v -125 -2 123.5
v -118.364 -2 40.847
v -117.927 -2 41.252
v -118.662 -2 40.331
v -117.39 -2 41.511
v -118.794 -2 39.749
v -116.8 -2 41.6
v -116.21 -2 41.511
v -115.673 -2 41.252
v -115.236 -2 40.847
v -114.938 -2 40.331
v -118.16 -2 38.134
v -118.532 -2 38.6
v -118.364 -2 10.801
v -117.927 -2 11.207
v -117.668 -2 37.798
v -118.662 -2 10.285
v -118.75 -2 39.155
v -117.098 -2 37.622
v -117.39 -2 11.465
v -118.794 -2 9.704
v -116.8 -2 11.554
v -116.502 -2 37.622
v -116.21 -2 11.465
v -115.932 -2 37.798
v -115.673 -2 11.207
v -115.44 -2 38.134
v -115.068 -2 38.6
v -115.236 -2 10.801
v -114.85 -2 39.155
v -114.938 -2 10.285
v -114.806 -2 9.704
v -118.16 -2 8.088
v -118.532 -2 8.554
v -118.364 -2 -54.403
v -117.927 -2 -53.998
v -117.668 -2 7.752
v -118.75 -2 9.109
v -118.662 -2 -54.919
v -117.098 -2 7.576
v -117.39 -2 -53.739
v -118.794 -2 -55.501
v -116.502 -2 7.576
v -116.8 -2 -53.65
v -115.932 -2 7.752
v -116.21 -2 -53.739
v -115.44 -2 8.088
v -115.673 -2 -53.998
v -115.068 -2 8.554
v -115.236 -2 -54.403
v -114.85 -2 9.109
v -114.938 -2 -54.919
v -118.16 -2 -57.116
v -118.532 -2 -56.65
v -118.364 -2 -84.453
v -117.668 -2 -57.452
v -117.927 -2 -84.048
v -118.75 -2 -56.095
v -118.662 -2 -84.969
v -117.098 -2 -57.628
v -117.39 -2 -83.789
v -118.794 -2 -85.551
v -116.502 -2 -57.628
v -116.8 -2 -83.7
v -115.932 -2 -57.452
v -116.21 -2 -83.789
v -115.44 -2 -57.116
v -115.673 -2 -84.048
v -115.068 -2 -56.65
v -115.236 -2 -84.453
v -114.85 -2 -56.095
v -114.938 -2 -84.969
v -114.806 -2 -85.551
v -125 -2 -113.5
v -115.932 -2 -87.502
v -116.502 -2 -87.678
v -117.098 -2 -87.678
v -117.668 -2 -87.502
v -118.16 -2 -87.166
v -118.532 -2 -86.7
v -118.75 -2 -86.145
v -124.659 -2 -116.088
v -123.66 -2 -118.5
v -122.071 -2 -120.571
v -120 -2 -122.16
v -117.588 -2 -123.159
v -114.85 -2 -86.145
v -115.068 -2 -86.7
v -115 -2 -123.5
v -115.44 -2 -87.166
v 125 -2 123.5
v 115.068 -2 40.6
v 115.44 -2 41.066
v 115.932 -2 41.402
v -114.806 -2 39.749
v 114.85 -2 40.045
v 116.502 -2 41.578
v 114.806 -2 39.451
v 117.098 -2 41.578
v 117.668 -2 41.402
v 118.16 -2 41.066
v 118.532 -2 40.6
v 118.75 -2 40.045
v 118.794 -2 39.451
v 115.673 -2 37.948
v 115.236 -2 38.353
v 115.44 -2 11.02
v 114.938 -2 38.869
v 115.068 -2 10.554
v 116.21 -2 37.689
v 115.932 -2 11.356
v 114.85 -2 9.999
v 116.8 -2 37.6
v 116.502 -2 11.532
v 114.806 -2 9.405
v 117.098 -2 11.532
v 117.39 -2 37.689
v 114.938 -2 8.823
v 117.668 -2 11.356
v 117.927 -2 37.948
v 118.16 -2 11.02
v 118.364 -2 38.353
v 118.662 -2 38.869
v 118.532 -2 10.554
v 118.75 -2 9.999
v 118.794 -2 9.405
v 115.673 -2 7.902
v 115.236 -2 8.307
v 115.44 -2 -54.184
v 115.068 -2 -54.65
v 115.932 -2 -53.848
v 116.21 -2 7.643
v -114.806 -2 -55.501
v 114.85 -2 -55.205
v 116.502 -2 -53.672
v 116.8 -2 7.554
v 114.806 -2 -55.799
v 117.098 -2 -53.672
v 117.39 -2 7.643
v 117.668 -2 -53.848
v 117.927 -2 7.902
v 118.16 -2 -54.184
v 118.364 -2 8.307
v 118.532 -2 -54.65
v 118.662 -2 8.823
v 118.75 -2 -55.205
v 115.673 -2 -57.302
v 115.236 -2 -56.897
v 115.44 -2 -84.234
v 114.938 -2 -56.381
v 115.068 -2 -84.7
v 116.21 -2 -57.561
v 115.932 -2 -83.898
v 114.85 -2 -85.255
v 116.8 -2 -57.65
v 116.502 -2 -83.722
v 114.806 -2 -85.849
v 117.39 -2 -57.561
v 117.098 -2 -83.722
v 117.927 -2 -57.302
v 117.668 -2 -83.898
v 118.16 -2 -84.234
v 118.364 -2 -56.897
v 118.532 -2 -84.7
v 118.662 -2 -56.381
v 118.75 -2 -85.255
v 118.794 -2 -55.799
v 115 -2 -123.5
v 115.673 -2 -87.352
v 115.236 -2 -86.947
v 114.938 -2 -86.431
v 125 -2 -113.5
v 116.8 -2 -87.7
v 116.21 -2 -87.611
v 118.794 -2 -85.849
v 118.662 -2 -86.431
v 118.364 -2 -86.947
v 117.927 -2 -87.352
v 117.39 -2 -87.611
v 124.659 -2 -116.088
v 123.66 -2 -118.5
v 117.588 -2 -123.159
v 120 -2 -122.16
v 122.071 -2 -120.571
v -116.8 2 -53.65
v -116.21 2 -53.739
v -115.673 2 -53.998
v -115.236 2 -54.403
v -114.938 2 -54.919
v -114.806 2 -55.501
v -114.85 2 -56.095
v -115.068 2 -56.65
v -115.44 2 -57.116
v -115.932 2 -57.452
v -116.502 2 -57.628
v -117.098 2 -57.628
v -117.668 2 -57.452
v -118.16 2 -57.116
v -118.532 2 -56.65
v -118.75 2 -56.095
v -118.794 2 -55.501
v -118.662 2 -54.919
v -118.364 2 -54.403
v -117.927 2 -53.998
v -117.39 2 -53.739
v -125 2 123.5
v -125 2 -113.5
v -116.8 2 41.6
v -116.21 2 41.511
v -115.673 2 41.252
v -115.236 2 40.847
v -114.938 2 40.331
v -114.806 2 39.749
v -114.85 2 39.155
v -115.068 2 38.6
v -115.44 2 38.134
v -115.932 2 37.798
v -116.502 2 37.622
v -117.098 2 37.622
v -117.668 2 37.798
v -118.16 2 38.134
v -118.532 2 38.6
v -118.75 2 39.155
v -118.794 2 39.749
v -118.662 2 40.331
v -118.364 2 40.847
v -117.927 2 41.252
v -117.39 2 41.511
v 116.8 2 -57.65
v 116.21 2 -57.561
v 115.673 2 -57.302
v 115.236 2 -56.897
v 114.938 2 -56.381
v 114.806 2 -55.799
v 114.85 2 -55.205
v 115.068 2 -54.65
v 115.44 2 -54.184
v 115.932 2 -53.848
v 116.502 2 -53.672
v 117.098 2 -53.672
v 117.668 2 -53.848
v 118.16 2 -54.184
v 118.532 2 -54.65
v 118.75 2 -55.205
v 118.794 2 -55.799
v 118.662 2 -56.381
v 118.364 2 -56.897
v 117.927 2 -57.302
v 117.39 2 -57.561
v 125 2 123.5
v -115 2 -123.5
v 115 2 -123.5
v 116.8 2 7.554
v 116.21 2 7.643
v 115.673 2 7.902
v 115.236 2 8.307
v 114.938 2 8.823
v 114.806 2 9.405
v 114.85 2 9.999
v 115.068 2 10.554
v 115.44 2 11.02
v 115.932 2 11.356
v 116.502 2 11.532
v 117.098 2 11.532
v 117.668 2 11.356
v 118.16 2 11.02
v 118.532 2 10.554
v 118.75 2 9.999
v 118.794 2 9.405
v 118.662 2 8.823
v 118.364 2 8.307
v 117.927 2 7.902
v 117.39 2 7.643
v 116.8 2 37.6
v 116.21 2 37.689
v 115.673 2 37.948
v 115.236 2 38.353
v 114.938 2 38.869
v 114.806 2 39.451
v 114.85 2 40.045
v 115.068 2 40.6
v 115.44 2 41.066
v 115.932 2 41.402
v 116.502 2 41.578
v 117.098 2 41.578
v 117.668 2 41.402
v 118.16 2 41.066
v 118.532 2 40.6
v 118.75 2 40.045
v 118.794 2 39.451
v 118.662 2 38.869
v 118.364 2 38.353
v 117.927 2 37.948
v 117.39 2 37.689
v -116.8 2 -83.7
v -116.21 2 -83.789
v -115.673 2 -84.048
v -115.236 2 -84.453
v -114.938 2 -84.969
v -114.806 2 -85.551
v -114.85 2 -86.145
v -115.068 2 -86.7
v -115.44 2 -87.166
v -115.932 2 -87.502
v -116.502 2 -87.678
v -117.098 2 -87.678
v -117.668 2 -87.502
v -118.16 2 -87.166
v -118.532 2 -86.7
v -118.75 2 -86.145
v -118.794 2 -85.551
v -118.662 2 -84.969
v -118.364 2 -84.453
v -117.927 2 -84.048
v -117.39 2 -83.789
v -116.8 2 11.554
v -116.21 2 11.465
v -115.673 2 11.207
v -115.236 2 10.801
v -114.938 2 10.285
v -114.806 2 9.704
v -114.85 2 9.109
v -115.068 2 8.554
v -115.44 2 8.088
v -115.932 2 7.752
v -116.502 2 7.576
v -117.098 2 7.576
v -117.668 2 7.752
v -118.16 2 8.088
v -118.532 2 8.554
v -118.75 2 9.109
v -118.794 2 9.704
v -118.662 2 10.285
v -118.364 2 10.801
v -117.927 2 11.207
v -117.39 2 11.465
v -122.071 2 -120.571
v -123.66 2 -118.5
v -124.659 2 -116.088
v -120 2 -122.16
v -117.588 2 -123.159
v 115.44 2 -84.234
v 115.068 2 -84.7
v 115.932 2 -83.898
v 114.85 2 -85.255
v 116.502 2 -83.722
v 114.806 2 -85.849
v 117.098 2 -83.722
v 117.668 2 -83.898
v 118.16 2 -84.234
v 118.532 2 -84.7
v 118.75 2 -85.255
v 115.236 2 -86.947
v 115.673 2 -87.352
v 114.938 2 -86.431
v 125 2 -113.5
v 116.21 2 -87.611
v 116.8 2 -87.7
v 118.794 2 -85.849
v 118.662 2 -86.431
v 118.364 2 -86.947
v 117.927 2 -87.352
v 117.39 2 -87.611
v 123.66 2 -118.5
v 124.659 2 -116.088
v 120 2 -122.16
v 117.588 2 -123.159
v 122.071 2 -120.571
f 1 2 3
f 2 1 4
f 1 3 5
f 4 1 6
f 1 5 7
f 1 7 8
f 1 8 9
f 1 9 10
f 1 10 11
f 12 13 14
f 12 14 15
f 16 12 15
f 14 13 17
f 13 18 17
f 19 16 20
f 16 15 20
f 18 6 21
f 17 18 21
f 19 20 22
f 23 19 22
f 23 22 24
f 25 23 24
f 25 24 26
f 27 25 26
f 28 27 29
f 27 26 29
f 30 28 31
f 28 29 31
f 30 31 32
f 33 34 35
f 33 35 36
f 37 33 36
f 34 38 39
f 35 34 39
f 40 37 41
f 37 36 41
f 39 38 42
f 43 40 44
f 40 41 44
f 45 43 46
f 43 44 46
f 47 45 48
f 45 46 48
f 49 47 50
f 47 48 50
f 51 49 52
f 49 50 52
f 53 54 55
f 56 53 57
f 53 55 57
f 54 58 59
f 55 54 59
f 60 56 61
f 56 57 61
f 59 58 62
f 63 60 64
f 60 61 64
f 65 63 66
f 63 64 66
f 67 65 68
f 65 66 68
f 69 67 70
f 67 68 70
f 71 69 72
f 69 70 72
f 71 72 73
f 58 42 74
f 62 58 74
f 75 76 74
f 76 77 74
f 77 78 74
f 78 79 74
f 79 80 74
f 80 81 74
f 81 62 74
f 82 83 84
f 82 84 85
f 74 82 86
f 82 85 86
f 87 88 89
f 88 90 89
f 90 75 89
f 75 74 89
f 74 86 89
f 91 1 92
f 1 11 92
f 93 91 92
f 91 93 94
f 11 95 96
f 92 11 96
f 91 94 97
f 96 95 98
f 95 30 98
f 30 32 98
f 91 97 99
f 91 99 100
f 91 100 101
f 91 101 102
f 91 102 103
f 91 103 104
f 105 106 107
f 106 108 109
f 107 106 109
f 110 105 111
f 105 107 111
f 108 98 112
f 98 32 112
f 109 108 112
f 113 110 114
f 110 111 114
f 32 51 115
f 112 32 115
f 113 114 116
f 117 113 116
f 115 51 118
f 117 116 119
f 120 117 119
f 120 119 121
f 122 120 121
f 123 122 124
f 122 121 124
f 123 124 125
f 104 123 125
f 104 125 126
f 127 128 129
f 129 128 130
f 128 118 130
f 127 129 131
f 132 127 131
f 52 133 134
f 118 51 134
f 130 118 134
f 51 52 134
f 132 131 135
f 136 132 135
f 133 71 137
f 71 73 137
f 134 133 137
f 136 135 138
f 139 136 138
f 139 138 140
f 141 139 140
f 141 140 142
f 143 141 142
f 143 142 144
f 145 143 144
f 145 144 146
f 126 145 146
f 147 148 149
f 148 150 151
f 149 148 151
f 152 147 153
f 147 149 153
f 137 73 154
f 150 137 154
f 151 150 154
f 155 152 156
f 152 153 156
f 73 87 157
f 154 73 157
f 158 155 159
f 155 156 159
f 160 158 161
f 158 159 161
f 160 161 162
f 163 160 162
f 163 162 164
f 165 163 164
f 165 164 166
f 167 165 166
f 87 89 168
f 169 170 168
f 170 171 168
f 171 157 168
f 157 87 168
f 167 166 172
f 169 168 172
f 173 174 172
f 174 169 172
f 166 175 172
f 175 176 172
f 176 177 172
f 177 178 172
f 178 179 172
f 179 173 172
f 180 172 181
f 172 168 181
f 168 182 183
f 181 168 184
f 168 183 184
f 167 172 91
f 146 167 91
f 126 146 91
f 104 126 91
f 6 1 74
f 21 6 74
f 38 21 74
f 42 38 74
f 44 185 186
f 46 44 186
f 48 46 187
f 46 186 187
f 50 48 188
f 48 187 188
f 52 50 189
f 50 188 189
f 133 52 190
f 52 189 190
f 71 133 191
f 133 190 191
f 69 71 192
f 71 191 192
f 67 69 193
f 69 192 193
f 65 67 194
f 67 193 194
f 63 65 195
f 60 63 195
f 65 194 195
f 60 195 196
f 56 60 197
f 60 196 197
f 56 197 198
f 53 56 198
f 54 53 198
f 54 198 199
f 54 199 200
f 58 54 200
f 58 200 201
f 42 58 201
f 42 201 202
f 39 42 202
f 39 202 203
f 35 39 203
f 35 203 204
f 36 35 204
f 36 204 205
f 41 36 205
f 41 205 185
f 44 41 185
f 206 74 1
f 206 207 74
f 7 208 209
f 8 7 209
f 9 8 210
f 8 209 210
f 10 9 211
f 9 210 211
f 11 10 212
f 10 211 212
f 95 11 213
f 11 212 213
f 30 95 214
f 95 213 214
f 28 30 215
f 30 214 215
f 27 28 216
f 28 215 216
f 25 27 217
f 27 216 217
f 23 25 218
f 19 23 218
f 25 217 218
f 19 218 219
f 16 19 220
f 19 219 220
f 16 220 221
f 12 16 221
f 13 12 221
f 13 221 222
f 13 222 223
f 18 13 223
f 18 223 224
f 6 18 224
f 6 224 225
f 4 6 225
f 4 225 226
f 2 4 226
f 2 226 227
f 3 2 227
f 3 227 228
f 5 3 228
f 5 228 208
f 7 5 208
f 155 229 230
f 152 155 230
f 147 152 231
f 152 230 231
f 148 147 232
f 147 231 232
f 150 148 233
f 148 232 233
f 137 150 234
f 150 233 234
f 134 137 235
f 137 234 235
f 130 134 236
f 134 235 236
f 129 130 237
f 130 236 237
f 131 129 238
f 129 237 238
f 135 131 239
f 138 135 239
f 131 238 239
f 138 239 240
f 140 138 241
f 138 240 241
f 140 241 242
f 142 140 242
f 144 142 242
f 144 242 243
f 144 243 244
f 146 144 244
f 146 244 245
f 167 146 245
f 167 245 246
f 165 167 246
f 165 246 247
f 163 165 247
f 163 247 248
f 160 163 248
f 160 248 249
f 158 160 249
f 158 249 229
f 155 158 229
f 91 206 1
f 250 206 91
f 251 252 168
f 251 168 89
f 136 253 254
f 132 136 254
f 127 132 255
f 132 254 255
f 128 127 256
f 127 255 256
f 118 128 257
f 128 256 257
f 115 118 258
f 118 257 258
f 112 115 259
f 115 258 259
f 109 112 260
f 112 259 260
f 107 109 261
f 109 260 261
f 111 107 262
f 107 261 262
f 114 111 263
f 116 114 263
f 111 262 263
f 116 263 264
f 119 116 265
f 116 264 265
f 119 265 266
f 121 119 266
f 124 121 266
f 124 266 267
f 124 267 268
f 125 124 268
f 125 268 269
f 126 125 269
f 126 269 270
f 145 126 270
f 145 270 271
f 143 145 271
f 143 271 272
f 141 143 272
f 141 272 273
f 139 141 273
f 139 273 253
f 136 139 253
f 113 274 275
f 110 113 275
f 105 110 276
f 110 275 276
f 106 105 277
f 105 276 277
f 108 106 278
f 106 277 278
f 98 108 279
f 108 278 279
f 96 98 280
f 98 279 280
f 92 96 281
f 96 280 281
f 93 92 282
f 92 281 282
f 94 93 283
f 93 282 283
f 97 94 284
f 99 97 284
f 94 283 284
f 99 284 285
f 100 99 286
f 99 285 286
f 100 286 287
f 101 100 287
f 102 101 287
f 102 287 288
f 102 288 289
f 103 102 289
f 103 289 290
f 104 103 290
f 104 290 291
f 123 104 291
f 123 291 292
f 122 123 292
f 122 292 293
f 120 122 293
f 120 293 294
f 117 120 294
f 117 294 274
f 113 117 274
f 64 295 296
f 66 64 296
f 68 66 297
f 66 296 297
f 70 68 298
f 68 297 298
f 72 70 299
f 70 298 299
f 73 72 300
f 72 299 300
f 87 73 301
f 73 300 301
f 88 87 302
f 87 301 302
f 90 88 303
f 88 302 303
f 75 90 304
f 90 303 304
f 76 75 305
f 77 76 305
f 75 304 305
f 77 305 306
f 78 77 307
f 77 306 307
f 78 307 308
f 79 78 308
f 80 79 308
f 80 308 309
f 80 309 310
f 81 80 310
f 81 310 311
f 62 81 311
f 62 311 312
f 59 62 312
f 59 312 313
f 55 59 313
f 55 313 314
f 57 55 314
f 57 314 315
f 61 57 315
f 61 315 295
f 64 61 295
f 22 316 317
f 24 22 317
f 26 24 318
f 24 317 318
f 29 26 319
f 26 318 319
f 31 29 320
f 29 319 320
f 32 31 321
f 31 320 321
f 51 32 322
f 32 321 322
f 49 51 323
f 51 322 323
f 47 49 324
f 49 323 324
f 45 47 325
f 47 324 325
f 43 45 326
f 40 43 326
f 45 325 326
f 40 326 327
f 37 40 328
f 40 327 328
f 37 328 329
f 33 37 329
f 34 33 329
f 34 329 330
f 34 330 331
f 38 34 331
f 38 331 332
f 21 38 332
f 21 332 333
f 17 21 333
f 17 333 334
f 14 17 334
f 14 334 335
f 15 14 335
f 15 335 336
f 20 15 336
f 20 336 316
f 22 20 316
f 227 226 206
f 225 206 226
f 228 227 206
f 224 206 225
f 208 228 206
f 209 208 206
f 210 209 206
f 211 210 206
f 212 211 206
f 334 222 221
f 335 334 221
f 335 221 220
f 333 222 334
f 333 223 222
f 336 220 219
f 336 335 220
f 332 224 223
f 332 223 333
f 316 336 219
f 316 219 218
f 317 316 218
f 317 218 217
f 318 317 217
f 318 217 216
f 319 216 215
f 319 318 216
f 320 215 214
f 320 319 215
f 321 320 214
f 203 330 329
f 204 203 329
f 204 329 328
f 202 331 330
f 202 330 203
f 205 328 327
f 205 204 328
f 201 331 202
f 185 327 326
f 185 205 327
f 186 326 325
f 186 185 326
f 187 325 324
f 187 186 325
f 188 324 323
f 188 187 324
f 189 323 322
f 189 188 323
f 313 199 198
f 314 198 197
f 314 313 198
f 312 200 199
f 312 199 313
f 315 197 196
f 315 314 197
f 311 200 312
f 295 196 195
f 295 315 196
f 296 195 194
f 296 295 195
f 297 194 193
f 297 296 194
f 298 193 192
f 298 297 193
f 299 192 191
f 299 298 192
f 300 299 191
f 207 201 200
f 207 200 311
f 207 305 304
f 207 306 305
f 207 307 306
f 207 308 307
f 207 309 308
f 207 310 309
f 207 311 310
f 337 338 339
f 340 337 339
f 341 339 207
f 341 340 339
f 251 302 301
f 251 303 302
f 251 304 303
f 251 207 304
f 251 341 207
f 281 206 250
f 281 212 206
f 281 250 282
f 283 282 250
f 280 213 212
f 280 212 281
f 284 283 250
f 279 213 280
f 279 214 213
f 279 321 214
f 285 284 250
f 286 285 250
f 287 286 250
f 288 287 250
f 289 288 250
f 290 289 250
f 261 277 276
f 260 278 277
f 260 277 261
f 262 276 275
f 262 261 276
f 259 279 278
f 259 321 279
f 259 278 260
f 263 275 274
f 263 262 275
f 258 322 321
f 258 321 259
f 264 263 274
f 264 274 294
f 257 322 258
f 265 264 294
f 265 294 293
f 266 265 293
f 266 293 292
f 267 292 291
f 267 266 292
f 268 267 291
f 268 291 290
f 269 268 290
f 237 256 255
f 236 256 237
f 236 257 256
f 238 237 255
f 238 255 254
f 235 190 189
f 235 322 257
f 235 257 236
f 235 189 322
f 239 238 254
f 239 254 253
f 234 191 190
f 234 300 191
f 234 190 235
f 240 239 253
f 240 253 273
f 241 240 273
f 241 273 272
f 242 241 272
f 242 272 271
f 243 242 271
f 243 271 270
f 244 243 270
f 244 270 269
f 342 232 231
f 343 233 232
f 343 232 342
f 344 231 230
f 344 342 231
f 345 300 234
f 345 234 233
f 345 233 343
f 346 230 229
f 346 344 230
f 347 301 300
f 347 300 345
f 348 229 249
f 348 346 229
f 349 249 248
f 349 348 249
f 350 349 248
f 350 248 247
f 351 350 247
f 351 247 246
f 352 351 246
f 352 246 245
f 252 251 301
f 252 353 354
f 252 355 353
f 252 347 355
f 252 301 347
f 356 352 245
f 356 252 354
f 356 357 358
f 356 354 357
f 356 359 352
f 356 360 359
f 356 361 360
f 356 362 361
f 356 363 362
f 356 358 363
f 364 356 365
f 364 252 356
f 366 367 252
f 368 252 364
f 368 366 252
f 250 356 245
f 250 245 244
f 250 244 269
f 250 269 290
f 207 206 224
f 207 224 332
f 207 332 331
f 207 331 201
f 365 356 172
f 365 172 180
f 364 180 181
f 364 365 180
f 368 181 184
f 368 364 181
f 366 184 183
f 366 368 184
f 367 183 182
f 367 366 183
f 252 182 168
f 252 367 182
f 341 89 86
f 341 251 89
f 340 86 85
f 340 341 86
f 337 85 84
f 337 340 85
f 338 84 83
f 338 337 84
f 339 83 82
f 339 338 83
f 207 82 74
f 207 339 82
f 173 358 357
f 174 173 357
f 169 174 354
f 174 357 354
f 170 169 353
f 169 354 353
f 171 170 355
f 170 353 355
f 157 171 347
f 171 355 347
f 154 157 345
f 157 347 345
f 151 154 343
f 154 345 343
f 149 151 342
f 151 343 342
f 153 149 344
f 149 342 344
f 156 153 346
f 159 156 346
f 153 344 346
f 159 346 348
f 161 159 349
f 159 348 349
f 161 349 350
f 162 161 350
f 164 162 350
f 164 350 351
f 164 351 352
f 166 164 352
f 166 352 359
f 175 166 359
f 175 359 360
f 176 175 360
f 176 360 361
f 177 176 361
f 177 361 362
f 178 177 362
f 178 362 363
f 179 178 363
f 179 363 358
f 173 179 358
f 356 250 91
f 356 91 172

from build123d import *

# Parameters (mm, degrees)
SALIENTE_EXTRUIR1_DEPTH = 2
CROQUIS2_R              = 2
CORTAR_EXTRUIR1_DEPTH   = 10


with BuildPart() as part:
    # Croquis1 → Saliente-Extruir1 (new, symmetric)
    with BuildSketch(Plane(origin=(0, 0, 0), x_dir=(1, 0, 0), z_dir=(0, 1, 0))):
        with BuildLine():
            Line((-125, -123.5), (125, -123.5))
            Line((125, -123.5), (125, 113.5))
            ThreePointArc((125, 113.5), (122.071067812, 120.571067812), (115, 123.5))
            Line((115, 123.5), (-115, 123.5))
            ThreePointArc((-115, 123.5), (-122.071067812, 120.571067812), (-125, 113.5))
            Line((-125, 113.5), (-125, -123.5))
        make_face()
    extrude(amount=SALIENTE_EXTRUIR1_DEPTH, both=True)

    # Croquis2 → Cortar-Extruir1 (cut)
    with BuildSketch(Plane(origin=(0, 2, 0), x_dir=(1, 0, 0), z_dir=(0, 1, 0))):
        with Locations(Location((-116.8, 85.7, 0), (0, 0, 270))):
            Circle(CROQUIS2_R)
        with Locations(Location((-116.8, 55.65, 0), (0, 0, 270))):
            Circle(CROQUIS2_R)
        with Locations(Location((-116.8, -9.554160022, 0), (0, 0, 270))):
            Circle(CROQUIS2_R)
        with Locations(Location((-116.8, -39.6, 0), (0, 0, 270))):
            Circle(CROQUIS2_R)
        with Locations(Location((116.8, -39.6, 0), (0, 0, 90))):
            Circle(CROQUIS2_R)
        with Locations(Location((116.8, -9.554160022, 0), (0, 0, 90))):
            Circle(CROQUIS2_R)
        with Locations(Location((116.8, 55.65, 0), (0, 0, 90))):
            Circle(CROQUIS2_R)
        with Locations(Location((116.8, 85.7, 0), (0, 0, 90))):
            Circle(CROQUIS2_R)
    extrude(amount=-CORTAR_EXTRUIR1_DEPTH, mode=Mode.SUBTRACT)


solid = part.part
